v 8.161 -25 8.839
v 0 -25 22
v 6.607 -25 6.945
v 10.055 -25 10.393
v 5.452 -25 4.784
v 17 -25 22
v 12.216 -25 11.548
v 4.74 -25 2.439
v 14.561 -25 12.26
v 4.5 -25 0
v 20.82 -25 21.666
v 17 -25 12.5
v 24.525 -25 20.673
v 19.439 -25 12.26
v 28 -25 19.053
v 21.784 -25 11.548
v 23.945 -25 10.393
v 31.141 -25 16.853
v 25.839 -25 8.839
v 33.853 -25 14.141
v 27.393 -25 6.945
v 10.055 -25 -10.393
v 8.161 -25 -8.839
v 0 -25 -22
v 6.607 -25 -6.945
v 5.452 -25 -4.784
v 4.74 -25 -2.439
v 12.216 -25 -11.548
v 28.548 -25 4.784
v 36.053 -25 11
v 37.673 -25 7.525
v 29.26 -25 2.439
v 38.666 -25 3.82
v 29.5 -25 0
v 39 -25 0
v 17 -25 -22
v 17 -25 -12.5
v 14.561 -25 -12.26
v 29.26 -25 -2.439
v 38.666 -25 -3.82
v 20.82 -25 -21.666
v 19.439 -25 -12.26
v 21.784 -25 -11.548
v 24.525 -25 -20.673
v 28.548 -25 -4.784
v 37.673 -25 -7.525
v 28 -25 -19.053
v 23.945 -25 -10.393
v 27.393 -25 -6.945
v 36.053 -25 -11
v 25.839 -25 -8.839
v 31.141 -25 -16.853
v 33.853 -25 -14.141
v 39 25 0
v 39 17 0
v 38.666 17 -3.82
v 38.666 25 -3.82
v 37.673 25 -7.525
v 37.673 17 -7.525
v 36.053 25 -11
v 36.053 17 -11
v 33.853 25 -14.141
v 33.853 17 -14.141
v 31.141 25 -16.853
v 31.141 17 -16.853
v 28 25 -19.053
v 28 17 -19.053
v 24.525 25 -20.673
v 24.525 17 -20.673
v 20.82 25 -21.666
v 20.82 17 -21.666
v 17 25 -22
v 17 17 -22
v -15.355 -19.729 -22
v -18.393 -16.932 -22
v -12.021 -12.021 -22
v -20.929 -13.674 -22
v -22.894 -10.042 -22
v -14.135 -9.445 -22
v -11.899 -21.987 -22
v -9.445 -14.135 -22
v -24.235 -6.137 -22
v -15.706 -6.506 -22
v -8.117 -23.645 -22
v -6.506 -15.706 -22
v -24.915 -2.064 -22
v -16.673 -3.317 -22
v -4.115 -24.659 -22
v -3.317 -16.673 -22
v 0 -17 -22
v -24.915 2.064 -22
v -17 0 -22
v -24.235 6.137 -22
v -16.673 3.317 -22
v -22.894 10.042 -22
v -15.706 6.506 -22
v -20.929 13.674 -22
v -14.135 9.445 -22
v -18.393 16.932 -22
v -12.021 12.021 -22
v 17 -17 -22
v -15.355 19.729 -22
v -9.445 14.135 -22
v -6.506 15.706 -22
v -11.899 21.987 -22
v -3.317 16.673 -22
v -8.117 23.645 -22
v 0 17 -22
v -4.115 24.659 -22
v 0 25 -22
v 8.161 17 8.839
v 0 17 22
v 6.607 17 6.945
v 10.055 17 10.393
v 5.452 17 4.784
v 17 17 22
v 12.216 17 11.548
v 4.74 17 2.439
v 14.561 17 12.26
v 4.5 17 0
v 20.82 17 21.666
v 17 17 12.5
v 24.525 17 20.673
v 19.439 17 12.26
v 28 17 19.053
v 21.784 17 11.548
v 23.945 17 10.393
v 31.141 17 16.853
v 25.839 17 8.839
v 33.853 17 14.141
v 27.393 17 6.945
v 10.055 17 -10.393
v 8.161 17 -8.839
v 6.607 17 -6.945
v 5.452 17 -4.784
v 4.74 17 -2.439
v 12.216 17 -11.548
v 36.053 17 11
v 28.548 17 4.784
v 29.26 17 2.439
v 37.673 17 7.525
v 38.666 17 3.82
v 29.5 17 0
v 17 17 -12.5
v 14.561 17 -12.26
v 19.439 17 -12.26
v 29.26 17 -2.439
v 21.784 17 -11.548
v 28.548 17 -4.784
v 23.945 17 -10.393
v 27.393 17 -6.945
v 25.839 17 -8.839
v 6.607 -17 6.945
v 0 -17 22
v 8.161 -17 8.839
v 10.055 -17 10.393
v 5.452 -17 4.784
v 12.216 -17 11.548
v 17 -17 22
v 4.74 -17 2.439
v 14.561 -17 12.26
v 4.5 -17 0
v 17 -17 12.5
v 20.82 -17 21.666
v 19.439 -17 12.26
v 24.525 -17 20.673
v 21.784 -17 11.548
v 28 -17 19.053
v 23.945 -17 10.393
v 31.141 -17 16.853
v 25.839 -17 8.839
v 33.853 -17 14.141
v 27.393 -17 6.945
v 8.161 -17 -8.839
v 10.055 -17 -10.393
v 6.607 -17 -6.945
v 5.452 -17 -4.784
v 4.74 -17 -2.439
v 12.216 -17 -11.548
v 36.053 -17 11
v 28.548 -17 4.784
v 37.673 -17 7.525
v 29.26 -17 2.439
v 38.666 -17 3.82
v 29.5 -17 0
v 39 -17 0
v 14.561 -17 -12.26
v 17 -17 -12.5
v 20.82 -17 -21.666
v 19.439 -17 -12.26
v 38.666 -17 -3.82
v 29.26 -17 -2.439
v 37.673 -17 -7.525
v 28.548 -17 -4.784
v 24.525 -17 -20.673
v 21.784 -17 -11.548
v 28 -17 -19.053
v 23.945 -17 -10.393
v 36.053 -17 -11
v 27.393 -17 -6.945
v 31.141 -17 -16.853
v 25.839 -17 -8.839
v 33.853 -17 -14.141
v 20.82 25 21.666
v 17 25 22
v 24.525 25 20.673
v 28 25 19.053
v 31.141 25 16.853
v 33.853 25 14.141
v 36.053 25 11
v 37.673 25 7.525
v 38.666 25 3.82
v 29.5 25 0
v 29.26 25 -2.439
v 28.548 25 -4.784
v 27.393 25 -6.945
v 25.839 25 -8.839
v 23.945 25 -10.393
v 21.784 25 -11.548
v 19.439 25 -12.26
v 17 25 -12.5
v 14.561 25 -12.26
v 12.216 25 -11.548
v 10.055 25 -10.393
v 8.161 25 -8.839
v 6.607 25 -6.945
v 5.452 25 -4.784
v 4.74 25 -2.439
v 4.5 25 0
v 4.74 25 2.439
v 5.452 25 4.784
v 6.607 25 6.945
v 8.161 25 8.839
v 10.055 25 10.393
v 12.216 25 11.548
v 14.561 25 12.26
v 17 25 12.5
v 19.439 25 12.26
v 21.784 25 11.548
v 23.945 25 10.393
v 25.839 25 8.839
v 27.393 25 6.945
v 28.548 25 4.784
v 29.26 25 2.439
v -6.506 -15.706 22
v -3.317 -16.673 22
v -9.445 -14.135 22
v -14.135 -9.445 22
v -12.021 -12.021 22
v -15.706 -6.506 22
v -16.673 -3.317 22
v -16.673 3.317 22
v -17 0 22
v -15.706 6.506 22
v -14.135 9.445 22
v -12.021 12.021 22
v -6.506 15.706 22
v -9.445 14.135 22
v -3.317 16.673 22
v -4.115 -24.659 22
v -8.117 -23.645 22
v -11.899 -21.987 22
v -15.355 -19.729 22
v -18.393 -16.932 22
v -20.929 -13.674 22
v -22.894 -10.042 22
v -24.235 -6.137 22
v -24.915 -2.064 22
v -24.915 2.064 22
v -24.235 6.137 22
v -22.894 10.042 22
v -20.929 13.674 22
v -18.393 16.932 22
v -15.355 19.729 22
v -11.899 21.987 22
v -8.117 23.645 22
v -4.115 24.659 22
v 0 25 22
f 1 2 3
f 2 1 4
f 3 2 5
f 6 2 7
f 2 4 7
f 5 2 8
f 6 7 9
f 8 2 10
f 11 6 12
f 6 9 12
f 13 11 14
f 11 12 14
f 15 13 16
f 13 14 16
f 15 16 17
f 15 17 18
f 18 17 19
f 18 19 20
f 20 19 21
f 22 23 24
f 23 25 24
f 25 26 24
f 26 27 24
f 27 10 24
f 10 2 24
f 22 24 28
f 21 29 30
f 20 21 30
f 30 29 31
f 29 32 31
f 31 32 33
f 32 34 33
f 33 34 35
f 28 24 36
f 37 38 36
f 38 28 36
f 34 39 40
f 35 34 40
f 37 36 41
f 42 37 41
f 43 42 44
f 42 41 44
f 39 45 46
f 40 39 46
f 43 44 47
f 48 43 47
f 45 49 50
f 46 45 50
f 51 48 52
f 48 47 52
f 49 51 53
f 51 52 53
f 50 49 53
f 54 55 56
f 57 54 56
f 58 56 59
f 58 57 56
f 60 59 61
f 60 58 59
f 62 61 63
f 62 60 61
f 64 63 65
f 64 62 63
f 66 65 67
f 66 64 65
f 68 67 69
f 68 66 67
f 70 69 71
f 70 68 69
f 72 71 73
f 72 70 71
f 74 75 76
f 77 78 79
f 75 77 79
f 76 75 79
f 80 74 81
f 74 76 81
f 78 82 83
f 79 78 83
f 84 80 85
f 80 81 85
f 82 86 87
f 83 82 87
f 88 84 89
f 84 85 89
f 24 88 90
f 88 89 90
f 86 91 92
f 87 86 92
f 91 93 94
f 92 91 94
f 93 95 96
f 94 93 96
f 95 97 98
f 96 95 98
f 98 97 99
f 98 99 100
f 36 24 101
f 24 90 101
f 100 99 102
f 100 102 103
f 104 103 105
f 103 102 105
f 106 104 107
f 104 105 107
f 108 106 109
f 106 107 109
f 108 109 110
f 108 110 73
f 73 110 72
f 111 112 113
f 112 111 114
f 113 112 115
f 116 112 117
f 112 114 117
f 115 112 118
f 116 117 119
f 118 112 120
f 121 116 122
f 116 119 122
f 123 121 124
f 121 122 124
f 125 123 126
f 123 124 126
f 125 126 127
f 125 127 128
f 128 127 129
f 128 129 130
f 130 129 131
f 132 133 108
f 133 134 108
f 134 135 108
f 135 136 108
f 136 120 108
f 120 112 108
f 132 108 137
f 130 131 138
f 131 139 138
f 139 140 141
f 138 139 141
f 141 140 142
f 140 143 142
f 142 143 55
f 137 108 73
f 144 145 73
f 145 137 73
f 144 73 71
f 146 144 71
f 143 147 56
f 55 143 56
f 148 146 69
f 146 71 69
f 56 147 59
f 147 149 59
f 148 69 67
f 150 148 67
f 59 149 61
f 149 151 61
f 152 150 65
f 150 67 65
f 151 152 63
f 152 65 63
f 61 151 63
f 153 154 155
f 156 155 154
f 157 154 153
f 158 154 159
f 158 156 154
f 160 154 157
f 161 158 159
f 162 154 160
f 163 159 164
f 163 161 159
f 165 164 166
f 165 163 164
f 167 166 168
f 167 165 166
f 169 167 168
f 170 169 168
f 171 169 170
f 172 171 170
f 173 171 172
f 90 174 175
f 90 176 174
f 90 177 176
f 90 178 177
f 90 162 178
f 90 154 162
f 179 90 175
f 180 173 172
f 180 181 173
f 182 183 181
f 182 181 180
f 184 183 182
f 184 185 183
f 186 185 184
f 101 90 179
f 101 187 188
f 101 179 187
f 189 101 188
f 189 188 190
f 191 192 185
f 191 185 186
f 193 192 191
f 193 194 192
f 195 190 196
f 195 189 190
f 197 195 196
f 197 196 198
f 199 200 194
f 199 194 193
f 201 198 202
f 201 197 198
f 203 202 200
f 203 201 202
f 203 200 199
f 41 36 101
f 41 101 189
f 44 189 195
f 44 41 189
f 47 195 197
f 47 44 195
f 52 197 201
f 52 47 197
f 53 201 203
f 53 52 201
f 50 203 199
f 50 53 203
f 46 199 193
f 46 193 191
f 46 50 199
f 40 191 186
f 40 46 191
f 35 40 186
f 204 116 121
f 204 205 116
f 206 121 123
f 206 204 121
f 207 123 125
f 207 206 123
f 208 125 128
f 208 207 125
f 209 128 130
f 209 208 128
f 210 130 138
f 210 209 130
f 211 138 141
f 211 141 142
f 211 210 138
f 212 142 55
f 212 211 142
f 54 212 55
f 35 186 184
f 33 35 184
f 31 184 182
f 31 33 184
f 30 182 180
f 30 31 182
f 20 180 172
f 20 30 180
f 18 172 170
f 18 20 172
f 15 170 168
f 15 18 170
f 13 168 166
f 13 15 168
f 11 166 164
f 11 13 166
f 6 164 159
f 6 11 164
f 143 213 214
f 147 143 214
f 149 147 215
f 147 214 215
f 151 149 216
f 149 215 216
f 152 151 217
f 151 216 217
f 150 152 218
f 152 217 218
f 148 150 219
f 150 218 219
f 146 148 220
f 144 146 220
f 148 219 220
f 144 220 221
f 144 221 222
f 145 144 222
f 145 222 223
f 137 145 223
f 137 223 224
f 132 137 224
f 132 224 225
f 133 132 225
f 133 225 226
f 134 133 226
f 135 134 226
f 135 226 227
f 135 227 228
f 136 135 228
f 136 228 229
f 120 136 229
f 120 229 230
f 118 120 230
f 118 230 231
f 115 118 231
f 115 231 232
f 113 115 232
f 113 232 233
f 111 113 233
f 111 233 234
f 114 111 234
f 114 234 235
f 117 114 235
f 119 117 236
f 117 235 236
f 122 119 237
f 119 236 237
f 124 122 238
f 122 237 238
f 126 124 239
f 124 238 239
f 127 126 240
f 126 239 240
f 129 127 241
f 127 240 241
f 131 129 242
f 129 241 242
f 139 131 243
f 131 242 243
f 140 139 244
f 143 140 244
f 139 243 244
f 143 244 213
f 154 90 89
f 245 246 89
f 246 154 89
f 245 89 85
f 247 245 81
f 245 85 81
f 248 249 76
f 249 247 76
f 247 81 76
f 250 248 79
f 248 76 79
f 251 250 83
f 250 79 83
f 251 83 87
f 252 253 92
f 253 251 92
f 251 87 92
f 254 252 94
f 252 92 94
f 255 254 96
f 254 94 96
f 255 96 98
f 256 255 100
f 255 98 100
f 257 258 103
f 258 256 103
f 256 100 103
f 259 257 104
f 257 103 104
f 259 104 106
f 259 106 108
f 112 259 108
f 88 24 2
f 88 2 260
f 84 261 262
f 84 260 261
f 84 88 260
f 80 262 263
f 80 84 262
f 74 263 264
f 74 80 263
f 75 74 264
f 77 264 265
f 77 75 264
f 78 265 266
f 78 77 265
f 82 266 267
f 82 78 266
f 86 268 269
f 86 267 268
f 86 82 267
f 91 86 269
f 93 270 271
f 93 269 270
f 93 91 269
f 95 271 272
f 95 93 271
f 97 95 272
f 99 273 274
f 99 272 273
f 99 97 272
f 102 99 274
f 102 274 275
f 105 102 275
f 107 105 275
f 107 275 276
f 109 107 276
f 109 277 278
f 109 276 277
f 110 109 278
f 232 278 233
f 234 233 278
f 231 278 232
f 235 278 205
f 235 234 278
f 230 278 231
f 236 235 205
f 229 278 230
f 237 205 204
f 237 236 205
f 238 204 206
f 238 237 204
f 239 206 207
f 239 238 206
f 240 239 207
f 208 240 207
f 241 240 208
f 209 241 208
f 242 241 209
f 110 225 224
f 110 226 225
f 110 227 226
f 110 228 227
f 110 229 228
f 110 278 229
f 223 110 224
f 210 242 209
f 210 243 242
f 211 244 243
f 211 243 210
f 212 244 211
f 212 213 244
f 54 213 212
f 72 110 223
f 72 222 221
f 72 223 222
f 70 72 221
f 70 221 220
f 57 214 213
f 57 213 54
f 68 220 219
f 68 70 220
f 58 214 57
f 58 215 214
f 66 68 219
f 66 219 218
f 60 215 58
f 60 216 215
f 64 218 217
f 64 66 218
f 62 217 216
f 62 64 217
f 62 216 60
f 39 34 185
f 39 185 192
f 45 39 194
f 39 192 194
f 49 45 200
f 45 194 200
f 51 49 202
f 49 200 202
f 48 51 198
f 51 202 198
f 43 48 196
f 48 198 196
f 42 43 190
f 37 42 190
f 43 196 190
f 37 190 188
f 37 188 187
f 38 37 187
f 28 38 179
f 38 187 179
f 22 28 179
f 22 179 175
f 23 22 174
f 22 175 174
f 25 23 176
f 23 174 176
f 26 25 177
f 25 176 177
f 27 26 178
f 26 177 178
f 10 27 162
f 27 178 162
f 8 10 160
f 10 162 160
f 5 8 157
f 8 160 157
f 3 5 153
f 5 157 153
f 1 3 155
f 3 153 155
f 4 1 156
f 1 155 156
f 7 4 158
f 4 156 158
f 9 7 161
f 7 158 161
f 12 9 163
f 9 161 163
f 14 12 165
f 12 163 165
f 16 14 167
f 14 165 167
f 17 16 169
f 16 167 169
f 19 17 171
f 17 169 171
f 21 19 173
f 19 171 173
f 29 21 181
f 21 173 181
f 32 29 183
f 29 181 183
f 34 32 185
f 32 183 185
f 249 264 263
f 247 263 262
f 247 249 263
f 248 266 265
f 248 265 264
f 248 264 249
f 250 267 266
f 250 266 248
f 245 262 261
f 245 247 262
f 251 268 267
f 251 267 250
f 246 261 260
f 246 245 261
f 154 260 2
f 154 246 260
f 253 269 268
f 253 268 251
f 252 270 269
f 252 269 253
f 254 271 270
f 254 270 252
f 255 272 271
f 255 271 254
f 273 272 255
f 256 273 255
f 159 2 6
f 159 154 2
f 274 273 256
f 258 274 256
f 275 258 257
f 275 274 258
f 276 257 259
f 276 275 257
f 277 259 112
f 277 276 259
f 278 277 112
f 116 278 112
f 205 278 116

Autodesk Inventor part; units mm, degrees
ref_plane "YZ Plane" through (0, 0, 0) normal (1, 0, 0) x (0, 1, 0)
ref_plane "XZ Plane" through (0, 0, 0) normal (0, 1, 0) x (-1, 0, 0)
ref_plane "XY Plane" through (0, 0, 0) normal (0, 0, 1) x (1, 0, 0)
sketch "草圖1" plane through (0, 0, 0) normal (0, 0, 1) x (1, 0, 0)
  arc A0 (0, 17) -> (0, -17) centre (0, 0) ccw
  arc A1 (0, 25) -> (0, -25) centre (0, 0) ccw
  line L0 (0, 27.0608) -> (0, -29.1984) construction
  line L1 (0, 25) -> (28, 25)
  line L2 (0, 17) -> (28, 17)
  line L3 (28, 25) -> (39, 25)
  line L4 (28, 17) -> (39, 17)
  line L5 (39, 17) -> (39, 25)
  line L6 (0, 0) -> (33.5, 0) construction
  line L7 (0, -25) -> (28, -25)
  line L8 (0, -17) -> (28, -17)
  line L9 (28, -25) -> (39, -25)
  line L10 (28, -17) -> (39, -17)
  line L11 (39, -17) -> (39, -25)
  dimension "d0" = 34
  dimension "d1" = 50
  dimension "d2" = 28
  dimension "d3" = 11
  dimension "d4" = 11
  dimension "d5" = 34
extrude "擠出1" add sketch "草圖1" along normal mid plane 44
fillet "圓角1" radius 22 4 edges at (39, 21, 22) (39, 21, -22) (39, -21, 22) (39, -21, -22)
sketch "草圖2" plane through (0, 25, 22) normal (0, 1, 0) x (1, 0, 0)
  arc A0 (17, 0) -> (17, 44) centre (17, 22) ccw projected
  circle A1 centre (17, 22) radius 12.5
  point P0 (0, 22)
  dimension "d9" = 25
extrude "擠出2" cut sketch "草圖2" against normal blind 60
properties part number "410571040練習三"
